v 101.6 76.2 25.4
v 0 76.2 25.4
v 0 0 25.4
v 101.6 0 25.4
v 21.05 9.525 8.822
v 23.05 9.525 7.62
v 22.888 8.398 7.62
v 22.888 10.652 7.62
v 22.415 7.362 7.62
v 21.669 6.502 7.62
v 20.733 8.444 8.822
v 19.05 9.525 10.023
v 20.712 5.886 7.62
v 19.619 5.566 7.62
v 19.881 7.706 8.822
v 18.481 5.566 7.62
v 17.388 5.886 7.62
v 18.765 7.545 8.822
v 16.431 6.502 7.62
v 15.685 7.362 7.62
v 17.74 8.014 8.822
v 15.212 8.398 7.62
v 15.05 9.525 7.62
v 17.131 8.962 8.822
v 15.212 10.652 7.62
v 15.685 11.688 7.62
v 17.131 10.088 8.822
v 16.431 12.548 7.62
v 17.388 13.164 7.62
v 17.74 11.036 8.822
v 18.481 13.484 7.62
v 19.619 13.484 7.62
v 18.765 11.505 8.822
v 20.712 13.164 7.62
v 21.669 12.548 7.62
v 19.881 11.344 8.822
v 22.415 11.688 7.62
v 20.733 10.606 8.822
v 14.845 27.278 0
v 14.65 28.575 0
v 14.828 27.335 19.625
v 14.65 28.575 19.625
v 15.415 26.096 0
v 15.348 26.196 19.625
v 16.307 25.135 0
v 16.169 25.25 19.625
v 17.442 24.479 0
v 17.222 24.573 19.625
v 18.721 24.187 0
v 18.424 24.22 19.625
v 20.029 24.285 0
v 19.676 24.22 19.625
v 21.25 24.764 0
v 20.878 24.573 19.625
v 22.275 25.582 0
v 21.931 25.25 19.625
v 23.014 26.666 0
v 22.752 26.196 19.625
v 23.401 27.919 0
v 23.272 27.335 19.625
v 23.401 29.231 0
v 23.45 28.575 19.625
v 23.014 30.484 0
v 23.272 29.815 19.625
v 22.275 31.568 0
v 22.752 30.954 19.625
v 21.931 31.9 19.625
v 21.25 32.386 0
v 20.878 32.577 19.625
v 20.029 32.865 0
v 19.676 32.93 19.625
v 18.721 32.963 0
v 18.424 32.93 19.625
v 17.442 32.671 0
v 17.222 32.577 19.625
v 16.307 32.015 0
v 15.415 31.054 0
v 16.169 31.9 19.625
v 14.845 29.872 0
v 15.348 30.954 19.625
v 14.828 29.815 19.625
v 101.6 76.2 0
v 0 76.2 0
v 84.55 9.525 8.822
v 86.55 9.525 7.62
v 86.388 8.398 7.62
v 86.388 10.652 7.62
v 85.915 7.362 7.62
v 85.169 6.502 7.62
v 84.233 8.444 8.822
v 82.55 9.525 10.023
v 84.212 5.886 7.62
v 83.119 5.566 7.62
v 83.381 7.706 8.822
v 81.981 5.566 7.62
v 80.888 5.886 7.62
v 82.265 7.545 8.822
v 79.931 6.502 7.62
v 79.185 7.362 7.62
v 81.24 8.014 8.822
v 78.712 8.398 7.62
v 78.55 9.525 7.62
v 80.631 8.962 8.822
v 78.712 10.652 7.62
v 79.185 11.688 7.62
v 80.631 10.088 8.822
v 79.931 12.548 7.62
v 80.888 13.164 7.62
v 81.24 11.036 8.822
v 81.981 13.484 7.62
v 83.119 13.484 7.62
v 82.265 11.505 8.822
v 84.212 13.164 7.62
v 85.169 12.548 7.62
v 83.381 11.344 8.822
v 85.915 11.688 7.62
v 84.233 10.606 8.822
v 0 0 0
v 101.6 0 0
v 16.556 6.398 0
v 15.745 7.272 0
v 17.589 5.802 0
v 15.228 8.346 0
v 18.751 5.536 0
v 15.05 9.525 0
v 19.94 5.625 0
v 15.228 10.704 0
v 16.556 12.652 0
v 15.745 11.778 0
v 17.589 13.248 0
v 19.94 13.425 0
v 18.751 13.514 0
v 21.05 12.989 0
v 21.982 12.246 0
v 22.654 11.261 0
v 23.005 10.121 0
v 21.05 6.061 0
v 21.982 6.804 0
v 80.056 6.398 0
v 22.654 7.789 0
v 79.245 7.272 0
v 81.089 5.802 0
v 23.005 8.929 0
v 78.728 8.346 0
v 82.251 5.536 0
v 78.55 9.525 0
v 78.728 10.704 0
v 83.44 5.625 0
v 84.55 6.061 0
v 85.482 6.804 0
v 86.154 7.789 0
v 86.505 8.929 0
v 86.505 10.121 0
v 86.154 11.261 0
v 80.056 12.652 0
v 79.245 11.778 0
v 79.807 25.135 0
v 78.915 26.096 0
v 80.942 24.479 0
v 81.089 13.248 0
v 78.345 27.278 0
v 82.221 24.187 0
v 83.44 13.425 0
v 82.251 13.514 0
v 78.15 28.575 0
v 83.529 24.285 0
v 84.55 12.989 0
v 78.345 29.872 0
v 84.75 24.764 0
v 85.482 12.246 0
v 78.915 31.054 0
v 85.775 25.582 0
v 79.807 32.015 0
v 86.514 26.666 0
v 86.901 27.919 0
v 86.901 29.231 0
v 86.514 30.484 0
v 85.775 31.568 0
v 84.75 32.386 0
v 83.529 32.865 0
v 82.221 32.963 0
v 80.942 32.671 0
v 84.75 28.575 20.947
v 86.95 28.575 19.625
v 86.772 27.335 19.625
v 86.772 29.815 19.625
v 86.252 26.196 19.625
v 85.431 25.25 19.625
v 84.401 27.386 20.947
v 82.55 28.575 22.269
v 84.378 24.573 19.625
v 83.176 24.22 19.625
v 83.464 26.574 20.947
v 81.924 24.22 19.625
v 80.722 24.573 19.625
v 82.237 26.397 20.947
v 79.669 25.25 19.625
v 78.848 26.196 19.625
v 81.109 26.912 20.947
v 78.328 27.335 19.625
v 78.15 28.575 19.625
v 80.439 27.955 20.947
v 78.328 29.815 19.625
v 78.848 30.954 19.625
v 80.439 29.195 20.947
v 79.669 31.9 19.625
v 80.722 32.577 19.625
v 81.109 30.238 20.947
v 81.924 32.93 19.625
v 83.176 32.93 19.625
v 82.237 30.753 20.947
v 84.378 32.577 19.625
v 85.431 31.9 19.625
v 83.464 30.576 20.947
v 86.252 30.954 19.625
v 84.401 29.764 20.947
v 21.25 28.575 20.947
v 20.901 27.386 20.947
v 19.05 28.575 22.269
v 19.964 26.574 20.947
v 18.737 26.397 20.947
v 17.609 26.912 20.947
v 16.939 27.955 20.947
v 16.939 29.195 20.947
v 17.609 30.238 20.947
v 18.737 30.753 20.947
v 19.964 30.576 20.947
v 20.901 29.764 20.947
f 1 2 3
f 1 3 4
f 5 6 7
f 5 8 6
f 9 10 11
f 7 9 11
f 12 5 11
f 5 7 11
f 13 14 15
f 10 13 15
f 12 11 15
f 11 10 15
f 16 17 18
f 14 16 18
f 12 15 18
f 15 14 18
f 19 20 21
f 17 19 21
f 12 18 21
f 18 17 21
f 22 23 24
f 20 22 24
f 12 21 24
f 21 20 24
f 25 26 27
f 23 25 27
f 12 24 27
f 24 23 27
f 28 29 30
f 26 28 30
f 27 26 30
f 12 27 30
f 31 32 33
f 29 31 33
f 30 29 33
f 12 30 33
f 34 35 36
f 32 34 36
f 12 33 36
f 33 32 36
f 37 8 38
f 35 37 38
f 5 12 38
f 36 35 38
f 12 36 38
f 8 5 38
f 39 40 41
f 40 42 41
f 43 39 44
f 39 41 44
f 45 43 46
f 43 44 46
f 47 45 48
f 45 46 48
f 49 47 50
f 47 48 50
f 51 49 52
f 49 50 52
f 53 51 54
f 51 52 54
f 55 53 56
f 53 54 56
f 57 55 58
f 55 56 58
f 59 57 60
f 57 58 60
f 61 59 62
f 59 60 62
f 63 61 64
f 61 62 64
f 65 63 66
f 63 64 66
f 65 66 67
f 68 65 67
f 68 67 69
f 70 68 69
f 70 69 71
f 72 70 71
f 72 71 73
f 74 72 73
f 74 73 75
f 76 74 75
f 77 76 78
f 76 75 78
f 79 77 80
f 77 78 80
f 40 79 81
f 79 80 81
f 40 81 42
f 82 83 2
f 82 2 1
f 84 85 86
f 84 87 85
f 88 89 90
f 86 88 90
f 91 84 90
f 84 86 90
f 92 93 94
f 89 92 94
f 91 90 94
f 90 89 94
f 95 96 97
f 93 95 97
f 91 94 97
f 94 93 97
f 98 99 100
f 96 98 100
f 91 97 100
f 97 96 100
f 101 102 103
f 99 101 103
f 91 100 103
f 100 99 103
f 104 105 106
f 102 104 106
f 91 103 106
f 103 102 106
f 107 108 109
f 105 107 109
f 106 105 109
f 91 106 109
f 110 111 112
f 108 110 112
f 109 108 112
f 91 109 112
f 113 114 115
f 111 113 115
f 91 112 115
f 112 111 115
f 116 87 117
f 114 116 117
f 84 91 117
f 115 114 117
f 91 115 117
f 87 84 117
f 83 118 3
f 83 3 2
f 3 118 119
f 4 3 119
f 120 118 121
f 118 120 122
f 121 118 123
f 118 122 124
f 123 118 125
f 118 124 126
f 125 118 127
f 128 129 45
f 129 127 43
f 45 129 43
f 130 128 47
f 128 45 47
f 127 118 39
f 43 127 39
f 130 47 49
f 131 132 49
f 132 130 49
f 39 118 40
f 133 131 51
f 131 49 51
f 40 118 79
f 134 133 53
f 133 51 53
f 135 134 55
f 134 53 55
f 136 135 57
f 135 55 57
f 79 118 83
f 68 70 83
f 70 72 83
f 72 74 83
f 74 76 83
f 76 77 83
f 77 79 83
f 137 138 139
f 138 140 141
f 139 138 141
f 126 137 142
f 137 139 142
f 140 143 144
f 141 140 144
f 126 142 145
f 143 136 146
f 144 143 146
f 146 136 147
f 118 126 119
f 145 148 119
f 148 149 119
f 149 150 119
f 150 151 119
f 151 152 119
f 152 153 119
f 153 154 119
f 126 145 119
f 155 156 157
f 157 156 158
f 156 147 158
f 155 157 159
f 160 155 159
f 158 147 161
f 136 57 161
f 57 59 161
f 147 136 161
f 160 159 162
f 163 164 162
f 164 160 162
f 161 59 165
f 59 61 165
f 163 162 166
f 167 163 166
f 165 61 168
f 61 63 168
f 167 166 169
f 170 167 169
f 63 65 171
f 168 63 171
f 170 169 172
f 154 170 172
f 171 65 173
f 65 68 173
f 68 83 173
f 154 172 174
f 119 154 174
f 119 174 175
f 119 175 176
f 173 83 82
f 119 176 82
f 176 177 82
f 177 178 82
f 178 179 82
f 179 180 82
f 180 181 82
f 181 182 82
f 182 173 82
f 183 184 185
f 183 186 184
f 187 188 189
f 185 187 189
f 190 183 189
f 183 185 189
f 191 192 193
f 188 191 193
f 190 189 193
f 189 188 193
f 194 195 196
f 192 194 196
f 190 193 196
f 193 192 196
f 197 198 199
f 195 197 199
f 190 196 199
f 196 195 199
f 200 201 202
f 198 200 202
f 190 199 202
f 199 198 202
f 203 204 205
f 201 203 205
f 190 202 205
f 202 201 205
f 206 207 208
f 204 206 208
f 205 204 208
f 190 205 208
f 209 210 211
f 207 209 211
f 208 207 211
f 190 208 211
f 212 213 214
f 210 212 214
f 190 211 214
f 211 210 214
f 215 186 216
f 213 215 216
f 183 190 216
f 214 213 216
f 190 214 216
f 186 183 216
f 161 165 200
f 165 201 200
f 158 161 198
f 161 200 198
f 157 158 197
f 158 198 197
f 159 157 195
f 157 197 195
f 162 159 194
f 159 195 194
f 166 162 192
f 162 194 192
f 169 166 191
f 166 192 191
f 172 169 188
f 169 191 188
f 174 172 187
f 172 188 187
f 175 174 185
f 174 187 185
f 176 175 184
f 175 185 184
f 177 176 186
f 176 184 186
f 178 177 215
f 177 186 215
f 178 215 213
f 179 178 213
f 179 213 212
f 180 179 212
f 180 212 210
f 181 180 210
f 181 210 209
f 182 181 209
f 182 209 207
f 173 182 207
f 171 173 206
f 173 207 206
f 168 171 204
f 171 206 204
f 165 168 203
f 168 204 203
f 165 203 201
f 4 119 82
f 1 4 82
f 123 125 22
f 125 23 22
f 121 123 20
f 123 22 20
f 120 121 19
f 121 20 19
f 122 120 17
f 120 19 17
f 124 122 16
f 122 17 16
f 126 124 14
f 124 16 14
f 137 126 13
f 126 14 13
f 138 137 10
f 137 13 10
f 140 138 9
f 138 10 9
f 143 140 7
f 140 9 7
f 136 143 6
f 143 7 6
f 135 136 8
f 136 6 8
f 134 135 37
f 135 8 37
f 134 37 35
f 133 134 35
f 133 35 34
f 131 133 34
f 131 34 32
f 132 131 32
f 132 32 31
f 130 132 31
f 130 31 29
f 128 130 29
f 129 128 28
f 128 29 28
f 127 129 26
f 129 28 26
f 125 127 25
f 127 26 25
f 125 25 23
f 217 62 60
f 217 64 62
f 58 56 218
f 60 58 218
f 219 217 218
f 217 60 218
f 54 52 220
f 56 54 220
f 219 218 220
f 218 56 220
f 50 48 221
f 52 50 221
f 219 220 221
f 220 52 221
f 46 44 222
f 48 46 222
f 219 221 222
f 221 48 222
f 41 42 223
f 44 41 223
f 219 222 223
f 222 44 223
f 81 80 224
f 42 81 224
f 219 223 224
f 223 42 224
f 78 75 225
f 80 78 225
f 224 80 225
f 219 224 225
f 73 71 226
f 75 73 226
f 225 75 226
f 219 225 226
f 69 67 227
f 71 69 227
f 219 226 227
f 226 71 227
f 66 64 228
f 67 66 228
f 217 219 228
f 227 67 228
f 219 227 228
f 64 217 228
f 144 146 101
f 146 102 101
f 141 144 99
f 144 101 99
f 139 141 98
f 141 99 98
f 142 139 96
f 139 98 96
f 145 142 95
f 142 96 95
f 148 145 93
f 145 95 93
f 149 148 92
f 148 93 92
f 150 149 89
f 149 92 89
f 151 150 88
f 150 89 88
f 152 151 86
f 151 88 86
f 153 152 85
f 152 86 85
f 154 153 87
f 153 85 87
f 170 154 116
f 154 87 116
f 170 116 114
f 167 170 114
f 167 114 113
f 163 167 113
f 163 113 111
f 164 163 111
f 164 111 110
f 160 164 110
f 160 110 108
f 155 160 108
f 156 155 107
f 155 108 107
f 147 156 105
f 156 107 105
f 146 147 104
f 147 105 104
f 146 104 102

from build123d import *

# Parameters (mm, degrees)
F0_W     = 101.6
F0_H     = 76.2
F1_DEPTH = 25.4
F2_D     = 8.8
F2_DEPTH = 19.625
F2_TIP   = 2.6437867237
F3_D     = 8
F3_DEPTH = 7.62
F3_TIP   = 2.4034424761


with BuildPart() as f1:
    # F0 (on Top) → F1 (new body)
    with BuildSketch(Plane.XY):
        with Locations((50.8, 38.1)):
            Rectangle(F0_W, F0_H)
    extrude(amount=F1_DEPTH)

    # F2
    with Locations(Plane(origin=(0, 0, 0), x_dir=(1, 0, 0), z_dir=(0, 0, -1))):
        with Locations((19.05, -28.575), (82.55, -28.575)):
            Hole(F2_D / 2, depth=F2_DEPTH)
            with Locations((0, 0, -(F2_DEPTH + F2_TIP / 2))):  # 118° drill point
                Cone(0, F2_D / 2, F2_TIP, mode=Mode.SUBTRACT)

    # F3
    with Locations(Plane(origin=(0, 0, 0), x_dir=(1, 0, 0), z_dir=(0, 0, -1))):
        with Locations((82.55, -9.525), (19.05, -9.525)):
            Hole(F3_D / 2, depth=F3_DEPTH)
            with Locations((0, 0, -(F3_DEPTH + F3_TIP / 2))):  # 118° drill point
                Cone(0, F3_D / 2, F3_TIP, mode=Mode.SUBTRACT)


solid = f1.part
